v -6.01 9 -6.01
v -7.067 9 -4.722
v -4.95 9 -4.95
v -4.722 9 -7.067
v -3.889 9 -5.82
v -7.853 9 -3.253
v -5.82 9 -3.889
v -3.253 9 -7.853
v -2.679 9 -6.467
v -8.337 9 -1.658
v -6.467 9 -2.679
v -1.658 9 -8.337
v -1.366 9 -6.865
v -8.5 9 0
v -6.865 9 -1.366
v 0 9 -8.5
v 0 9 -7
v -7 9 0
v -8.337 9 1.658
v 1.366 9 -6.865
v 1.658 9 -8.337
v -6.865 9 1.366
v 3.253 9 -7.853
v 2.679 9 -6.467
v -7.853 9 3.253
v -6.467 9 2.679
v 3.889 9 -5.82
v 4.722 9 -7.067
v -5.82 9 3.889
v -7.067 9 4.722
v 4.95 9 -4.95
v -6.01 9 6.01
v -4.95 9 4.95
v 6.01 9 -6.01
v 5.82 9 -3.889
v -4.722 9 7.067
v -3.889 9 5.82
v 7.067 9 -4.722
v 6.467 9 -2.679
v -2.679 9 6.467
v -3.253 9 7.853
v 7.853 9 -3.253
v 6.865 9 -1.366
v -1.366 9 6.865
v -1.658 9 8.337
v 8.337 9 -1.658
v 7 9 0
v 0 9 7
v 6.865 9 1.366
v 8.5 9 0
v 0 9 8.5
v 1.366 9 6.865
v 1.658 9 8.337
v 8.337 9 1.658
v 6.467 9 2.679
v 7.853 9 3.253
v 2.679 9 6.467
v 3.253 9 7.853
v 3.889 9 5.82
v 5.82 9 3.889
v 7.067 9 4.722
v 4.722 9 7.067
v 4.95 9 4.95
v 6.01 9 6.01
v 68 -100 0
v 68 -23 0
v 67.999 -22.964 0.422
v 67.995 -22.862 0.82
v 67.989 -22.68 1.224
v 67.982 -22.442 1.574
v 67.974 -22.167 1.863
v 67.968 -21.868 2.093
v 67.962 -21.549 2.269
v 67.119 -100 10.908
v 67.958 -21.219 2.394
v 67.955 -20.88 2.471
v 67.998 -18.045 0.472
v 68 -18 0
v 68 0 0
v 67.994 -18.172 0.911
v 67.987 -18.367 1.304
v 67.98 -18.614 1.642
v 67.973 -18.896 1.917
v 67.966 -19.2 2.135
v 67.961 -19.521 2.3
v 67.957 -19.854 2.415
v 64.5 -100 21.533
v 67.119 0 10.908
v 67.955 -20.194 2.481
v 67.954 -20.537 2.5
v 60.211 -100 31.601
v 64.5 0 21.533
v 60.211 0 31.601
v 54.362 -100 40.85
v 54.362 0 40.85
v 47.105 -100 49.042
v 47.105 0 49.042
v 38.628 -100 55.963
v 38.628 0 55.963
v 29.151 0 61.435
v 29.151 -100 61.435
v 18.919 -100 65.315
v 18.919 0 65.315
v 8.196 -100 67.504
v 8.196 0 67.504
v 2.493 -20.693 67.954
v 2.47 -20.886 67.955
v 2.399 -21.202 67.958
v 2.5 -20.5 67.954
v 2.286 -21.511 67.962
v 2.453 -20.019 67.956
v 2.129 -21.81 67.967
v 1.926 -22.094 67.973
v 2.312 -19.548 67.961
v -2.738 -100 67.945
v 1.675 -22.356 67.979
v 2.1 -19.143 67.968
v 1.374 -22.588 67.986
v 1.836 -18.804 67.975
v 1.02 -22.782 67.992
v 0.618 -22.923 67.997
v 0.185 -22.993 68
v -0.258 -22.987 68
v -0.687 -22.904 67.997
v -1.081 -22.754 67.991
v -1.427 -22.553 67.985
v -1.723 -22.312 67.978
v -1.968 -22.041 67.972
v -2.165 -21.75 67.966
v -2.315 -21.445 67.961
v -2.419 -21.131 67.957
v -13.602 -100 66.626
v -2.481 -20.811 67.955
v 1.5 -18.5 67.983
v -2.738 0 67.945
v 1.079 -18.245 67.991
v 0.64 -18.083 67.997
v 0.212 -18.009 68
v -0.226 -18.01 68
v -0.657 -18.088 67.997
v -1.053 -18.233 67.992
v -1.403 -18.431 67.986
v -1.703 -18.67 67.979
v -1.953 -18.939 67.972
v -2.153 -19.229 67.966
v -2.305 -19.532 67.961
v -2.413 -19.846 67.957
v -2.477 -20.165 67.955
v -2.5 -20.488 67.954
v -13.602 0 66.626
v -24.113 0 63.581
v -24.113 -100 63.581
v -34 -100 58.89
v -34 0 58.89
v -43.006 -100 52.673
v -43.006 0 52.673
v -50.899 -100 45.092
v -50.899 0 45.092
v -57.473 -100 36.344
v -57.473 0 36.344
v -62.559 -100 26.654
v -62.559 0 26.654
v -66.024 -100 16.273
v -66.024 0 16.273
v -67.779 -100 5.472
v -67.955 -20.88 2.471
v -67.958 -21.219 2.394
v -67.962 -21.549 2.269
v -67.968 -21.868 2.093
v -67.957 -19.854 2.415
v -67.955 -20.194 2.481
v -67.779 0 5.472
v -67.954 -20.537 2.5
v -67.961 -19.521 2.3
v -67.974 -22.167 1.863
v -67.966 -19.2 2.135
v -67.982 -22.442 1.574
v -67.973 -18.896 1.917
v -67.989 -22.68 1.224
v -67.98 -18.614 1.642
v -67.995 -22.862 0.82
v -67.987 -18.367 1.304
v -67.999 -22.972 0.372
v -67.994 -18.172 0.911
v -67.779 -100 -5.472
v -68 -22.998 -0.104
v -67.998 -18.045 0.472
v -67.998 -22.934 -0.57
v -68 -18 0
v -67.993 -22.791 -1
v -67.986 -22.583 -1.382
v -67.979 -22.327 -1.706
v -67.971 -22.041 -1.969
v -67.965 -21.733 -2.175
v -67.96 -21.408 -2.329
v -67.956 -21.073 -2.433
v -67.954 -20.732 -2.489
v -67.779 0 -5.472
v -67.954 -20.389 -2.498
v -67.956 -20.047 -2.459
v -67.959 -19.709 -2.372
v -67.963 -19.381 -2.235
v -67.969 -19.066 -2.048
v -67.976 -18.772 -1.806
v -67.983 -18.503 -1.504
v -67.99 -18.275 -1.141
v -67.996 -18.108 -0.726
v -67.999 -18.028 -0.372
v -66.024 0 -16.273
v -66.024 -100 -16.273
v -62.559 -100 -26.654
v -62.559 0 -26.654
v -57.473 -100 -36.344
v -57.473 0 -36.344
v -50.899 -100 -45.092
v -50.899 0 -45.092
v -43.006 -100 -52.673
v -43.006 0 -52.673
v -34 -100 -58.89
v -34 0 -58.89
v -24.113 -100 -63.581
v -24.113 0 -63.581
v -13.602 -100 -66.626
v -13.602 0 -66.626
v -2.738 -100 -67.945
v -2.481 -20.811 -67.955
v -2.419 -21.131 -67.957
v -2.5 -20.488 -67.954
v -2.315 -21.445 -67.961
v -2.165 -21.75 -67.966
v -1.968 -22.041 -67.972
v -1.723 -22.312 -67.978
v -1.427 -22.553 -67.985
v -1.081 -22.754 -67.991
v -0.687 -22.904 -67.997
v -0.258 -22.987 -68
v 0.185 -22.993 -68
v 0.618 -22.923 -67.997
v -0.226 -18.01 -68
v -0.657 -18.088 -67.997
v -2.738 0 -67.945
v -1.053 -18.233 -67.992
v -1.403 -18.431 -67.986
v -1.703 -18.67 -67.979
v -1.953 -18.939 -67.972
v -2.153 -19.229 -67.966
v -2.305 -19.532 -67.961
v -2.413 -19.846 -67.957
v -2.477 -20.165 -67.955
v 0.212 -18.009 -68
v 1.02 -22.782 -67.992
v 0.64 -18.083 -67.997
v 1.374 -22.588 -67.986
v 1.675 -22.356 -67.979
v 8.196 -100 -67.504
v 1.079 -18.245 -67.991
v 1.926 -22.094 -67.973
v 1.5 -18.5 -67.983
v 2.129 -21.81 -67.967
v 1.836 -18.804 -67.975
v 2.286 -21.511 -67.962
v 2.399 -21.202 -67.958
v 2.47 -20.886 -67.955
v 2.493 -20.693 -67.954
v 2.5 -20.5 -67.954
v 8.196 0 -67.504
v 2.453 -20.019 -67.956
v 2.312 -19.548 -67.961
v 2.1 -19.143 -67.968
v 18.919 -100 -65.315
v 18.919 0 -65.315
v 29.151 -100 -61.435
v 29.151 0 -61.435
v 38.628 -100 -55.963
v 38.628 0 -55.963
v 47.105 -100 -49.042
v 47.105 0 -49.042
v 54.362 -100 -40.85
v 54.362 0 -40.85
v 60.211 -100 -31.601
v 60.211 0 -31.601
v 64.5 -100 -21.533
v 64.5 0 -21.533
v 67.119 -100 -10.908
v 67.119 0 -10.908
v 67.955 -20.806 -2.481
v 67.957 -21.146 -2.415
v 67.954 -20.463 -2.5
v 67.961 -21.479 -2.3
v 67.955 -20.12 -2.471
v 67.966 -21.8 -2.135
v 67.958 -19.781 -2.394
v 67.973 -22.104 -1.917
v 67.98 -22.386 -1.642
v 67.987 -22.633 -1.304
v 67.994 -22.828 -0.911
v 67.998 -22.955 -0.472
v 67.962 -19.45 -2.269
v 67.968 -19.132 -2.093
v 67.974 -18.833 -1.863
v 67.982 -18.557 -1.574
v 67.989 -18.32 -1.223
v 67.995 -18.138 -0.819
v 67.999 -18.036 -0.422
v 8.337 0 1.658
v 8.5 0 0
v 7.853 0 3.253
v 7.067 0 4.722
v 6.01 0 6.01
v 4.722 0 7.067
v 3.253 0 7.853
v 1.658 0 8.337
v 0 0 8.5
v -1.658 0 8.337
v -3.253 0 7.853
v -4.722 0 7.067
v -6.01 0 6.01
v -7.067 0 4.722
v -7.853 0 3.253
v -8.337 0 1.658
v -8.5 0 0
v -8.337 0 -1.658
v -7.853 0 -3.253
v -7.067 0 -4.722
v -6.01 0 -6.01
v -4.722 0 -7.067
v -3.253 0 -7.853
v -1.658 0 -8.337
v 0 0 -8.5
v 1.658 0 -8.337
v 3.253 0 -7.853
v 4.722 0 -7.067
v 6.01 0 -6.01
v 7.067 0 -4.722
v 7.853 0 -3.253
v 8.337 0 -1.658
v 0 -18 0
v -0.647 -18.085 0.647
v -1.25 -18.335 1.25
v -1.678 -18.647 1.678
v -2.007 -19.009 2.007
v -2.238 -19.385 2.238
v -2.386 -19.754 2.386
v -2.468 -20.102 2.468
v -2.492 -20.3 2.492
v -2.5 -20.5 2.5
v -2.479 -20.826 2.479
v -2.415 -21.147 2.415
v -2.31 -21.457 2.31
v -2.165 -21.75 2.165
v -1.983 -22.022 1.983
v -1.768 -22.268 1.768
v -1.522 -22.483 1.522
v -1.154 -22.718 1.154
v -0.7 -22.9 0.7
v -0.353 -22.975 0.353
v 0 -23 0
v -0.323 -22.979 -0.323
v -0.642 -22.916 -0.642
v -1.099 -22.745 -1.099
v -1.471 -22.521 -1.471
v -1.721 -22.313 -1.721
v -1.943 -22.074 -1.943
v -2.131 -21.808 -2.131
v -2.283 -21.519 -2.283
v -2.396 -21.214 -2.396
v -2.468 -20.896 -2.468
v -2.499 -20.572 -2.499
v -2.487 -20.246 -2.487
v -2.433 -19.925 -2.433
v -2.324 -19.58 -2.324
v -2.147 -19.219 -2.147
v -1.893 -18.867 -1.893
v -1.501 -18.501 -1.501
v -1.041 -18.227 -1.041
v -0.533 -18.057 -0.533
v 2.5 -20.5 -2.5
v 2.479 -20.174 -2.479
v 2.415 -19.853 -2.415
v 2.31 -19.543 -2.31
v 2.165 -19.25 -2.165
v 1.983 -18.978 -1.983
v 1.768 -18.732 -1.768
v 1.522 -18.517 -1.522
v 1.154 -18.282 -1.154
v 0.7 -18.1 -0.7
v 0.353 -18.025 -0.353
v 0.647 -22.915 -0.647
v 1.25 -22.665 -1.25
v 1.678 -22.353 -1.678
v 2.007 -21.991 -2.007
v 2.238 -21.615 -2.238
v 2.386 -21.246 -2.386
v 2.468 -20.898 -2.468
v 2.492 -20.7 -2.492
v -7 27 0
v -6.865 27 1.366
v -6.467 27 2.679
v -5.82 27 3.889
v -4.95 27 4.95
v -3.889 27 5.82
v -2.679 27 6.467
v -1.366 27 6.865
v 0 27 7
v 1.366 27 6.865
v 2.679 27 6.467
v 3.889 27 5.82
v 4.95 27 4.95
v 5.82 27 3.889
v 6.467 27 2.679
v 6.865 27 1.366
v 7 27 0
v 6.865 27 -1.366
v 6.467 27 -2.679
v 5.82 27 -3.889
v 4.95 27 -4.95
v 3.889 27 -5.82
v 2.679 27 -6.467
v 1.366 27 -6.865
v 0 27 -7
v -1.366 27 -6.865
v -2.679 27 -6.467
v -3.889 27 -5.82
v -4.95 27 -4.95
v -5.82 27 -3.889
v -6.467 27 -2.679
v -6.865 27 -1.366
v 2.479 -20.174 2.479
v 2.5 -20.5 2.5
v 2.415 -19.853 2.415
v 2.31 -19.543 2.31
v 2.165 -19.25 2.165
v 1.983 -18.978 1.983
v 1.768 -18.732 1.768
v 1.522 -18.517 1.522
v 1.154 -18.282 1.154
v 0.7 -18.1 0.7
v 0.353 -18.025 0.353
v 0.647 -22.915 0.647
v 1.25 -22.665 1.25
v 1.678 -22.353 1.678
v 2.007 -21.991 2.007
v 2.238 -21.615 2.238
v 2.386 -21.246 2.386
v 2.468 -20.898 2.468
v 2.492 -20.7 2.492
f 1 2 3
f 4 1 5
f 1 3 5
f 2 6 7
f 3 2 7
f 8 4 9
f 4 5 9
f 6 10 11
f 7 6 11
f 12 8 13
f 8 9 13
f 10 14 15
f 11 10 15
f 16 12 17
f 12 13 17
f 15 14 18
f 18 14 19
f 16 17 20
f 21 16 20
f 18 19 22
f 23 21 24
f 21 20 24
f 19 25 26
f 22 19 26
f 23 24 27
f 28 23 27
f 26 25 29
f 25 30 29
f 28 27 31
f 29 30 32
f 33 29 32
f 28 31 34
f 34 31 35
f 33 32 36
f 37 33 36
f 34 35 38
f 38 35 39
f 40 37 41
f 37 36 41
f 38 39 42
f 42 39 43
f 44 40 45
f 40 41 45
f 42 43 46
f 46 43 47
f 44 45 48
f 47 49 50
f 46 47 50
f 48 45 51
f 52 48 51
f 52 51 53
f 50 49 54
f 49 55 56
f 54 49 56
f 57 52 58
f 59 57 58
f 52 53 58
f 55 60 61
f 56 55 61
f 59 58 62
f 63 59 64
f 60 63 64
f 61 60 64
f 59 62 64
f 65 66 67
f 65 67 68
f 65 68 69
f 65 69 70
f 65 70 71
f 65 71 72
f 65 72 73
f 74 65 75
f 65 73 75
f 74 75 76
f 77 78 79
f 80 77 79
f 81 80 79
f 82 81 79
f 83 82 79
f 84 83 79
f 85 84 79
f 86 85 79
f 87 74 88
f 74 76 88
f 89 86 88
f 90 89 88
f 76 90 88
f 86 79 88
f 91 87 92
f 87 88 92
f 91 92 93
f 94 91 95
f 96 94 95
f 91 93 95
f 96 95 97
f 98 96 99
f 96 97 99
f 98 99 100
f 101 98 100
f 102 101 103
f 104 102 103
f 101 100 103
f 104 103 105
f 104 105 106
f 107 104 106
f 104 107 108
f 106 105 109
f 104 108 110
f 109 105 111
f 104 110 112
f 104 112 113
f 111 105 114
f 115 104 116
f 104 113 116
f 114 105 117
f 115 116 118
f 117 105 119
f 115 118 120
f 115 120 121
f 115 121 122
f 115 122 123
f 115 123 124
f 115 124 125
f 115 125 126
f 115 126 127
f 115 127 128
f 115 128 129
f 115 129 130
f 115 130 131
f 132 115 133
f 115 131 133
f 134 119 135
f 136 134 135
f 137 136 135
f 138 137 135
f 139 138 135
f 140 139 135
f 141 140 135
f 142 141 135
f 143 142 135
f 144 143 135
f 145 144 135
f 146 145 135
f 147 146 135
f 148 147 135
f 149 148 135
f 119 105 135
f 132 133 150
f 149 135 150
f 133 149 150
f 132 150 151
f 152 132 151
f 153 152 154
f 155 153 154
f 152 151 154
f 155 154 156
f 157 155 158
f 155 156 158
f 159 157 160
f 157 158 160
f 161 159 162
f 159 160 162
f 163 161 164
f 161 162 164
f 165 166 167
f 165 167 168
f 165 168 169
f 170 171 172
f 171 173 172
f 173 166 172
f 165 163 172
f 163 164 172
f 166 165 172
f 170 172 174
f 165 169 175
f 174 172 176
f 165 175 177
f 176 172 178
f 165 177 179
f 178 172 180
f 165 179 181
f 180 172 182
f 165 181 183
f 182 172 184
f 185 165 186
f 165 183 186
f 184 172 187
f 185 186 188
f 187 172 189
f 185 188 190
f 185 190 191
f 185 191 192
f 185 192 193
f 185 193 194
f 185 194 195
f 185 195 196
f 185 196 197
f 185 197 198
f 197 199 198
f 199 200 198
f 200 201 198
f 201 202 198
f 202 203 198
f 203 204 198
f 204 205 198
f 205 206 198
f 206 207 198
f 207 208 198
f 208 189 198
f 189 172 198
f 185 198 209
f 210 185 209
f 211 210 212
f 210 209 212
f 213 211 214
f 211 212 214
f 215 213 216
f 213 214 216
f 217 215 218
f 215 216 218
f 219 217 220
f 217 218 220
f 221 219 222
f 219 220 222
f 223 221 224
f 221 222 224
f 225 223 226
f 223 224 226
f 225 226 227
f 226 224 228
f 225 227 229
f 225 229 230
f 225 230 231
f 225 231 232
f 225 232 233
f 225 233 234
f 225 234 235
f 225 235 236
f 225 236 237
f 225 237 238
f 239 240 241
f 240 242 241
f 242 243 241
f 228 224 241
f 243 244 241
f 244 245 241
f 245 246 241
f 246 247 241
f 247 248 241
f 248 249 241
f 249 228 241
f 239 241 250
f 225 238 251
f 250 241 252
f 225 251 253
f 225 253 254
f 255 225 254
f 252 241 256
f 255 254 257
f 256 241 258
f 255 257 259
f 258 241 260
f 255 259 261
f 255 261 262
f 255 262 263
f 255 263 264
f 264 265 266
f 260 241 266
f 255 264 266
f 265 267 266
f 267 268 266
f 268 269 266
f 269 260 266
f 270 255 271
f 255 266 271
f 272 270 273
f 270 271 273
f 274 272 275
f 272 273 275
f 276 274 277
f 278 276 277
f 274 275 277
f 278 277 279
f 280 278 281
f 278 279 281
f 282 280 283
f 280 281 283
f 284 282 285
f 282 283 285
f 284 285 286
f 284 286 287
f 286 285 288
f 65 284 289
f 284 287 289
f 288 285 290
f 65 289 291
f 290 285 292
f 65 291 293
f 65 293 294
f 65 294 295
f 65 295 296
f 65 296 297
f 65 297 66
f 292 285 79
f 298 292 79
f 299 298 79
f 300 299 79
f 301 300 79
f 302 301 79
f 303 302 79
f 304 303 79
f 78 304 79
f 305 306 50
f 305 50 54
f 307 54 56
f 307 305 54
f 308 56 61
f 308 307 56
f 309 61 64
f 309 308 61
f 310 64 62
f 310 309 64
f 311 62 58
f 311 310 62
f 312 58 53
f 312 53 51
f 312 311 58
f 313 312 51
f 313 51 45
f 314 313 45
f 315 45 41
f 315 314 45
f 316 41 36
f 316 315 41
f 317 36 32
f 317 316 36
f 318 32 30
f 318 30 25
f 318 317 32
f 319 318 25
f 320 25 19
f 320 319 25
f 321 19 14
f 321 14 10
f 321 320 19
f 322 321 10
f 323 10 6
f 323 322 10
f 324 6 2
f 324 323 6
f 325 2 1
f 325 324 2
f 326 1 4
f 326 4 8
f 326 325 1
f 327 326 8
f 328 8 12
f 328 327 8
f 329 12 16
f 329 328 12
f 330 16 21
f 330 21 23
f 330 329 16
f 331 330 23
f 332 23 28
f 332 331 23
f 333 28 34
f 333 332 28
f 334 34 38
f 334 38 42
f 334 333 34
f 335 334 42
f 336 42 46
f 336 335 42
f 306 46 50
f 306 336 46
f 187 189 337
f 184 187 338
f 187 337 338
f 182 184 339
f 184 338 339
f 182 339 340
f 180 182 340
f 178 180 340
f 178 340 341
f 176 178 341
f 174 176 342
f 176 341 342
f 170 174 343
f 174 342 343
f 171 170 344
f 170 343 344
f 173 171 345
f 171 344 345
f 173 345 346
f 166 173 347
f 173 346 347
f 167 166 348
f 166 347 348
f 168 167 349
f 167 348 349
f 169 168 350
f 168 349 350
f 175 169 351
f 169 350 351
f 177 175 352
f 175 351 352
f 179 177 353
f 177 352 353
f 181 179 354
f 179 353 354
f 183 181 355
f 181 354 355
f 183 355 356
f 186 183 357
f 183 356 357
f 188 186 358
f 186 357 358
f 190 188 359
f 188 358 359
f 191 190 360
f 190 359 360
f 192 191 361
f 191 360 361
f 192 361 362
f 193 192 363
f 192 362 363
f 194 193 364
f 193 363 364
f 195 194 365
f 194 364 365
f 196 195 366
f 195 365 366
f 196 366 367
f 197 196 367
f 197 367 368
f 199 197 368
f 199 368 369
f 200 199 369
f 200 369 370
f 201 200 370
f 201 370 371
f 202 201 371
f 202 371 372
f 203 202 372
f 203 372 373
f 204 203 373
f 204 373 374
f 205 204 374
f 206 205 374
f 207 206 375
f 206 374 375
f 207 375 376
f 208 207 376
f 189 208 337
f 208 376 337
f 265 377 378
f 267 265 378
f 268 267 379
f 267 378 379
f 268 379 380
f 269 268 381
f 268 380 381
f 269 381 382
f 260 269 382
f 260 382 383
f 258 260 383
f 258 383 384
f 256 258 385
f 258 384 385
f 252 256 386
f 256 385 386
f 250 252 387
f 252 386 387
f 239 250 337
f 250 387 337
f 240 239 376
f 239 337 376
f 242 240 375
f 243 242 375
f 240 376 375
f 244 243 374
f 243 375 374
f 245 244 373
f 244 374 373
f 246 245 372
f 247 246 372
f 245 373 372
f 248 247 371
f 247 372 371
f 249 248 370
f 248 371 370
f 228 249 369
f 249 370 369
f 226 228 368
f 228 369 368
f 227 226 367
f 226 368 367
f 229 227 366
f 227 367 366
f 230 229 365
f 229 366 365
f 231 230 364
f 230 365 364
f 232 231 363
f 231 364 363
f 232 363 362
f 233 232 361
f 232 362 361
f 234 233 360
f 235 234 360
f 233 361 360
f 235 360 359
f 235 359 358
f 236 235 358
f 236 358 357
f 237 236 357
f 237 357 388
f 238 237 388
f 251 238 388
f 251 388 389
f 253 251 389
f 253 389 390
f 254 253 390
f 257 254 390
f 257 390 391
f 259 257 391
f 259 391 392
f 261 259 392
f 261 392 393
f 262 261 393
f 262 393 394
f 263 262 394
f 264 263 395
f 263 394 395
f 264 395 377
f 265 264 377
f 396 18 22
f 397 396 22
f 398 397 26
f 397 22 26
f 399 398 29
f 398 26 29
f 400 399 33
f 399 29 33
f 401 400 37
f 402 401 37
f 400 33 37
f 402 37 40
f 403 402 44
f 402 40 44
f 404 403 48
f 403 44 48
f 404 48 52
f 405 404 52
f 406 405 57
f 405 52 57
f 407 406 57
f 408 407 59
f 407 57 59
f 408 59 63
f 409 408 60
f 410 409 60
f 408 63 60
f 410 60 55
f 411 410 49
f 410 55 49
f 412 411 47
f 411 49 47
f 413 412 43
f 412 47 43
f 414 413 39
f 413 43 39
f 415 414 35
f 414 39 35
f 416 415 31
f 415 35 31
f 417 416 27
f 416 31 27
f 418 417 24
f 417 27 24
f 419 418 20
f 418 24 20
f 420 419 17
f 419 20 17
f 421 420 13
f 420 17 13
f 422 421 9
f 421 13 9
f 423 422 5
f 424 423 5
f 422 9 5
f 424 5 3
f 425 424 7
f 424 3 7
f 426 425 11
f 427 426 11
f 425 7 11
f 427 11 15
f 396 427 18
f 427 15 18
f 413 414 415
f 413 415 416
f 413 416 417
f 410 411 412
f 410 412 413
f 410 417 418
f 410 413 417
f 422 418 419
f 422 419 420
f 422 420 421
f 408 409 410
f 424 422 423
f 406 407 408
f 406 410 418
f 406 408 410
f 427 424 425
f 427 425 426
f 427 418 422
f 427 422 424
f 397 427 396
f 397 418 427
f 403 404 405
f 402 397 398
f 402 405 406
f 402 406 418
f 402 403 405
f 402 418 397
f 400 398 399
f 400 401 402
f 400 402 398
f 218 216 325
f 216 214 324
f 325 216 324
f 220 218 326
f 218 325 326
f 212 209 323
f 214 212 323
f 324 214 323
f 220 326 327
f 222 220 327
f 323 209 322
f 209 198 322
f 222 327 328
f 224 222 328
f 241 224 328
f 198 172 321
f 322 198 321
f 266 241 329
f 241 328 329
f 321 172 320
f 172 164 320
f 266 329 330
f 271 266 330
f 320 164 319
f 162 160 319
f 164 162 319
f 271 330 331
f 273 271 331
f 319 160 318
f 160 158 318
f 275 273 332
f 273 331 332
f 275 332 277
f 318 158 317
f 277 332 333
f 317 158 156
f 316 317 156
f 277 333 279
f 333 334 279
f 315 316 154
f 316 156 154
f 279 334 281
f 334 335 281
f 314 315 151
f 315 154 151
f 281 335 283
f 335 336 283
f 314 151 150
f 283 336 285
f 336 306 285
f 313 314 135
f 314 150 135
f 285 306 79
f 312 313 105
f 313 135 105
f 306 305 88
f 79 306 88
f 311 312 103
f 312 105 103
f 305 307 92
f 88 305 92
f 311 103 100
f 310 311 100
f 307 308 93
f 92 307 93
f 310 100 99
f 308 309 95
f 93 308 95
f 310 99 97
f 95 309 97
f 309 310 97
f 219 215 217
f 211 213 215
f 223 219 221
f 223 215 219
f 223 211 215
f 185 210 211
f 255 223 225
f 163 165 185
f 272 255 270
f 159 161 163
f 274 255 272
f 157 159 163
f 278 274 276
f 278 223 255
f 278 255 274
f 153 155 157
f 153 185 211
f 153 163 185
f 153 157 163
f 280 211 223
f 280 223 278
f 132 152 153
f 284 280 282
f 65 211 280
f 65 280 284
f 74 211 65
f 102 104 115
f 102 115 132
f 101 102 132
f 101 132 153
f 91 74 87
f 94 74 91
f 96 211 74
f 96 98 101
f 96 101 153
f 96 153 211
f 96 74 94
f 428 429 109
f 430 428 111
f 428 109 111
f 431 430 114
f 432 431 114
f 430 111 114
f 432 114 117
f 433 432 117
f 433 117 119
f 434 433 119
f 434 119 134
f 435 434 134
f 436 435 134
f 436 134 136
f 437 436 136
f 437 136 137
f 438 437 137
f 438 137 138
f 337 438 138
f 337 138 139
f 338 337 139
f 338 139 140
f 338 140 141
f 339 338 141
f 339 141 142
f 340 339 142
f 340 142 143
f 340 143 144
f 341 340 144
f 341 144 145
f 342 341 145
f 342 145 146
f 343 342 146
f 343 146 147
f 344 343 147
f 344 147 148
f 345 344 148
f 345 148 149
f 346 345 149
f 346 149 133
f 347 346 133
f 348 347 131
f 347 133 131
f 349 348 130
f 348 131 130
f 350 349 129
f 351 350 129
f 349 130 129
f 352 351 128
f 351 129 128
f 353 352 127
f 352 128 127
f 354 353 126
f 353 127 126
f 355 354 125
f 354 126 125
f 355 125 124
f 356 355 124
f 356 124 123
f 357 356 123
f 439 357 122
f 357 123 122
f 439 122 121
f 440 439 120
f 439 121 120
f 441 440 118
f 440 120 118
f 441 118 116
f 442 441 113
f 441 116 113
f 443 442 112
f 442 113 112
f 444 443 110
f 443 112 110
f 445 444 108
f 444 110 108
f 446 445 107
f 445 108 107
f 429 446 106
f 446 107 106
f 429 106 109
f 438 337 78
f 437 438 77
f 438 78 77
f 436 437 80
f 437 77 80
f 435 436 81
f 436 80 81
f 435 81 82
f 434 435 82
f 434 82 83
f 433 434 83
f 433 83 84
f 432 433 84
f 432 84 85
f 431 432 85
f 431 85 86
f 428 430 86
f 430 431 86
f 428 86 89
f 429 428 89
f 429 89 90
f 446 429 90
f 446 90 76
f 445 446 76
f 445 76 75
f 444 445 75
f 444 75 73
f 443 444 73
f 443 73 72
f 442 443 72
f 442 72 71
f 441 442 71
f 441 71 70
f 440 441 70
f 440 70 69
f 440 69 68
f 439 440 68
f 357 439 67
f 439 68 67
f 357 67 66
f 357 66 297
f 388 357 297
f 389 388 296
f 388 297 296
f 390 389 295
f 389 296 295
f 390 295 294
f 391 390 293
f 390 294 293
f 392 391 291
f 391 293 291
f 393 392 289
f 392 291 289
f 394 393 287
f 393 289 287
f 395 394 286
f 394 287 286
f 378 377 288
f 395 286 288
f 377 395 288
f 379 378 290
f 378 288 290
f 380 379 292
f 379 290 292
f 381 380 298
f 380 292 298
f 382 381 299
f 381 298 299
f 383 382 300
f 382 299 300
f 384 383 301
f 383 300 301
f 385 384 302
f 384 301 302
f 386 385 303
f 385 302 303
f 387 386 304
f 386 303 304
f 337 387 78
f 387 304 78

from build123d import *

# Parameters (mm, degrees)
F0_R     = 68
F0_R_2   = 8.5
F1_DEPTH = 100
F2_DEPTH = 9
F4_R     = 2.5
F5_DEPTH = 75
F6_R     = 2.5
F7_DEPTH = 75
F3_R     = 7
F8_DEPTH = 18


with BuildPart() as f1:
    # F0 (on Front) → F1 (new body)
    with BuildSketch(Plane.XZ):
        Circle(F0_R)
        Circle(F0_R_2, mode=Mode.SUBTRACT)
        Circle(F0_R_2)
    extrude(amount=F1_DEPTH)

    # F0 (on Front) → F2 (join)
    with BuildSketch(Plane.XZ):
        Circle(F0_R_2)
    extrude(amount=-F2_DEPTH)

    # F4 (on Top) → F5 (cut, symmetric)
    with BuildSketch(Plane.XY):
        with Locations((0, -20.5)):
            Circle(F4_R)
    extrude(amount=F5_DEPTH, both=True, mode=Mode.SUBTRACT)

    # F6 (on Right) → F7 (cut, symmetric)
    with BuildSketch(Plane.YZ):
        with Locations((-20.5, 0)):
            Circle(F6_R)
    extrude(amount=F7_DEPTH, both=True, mode=Mode.SUBTRACT)

    # F3 (on face) → F8 (join)
    with BuildSketch(Plane(origin=(0, 9, 0), x_dir=(-1, 0, 0), z_dir=(0, 1, 0))):
        Circle(F3_R)
    extrude(amount=F8_DEPTH)


solid = f1.part
